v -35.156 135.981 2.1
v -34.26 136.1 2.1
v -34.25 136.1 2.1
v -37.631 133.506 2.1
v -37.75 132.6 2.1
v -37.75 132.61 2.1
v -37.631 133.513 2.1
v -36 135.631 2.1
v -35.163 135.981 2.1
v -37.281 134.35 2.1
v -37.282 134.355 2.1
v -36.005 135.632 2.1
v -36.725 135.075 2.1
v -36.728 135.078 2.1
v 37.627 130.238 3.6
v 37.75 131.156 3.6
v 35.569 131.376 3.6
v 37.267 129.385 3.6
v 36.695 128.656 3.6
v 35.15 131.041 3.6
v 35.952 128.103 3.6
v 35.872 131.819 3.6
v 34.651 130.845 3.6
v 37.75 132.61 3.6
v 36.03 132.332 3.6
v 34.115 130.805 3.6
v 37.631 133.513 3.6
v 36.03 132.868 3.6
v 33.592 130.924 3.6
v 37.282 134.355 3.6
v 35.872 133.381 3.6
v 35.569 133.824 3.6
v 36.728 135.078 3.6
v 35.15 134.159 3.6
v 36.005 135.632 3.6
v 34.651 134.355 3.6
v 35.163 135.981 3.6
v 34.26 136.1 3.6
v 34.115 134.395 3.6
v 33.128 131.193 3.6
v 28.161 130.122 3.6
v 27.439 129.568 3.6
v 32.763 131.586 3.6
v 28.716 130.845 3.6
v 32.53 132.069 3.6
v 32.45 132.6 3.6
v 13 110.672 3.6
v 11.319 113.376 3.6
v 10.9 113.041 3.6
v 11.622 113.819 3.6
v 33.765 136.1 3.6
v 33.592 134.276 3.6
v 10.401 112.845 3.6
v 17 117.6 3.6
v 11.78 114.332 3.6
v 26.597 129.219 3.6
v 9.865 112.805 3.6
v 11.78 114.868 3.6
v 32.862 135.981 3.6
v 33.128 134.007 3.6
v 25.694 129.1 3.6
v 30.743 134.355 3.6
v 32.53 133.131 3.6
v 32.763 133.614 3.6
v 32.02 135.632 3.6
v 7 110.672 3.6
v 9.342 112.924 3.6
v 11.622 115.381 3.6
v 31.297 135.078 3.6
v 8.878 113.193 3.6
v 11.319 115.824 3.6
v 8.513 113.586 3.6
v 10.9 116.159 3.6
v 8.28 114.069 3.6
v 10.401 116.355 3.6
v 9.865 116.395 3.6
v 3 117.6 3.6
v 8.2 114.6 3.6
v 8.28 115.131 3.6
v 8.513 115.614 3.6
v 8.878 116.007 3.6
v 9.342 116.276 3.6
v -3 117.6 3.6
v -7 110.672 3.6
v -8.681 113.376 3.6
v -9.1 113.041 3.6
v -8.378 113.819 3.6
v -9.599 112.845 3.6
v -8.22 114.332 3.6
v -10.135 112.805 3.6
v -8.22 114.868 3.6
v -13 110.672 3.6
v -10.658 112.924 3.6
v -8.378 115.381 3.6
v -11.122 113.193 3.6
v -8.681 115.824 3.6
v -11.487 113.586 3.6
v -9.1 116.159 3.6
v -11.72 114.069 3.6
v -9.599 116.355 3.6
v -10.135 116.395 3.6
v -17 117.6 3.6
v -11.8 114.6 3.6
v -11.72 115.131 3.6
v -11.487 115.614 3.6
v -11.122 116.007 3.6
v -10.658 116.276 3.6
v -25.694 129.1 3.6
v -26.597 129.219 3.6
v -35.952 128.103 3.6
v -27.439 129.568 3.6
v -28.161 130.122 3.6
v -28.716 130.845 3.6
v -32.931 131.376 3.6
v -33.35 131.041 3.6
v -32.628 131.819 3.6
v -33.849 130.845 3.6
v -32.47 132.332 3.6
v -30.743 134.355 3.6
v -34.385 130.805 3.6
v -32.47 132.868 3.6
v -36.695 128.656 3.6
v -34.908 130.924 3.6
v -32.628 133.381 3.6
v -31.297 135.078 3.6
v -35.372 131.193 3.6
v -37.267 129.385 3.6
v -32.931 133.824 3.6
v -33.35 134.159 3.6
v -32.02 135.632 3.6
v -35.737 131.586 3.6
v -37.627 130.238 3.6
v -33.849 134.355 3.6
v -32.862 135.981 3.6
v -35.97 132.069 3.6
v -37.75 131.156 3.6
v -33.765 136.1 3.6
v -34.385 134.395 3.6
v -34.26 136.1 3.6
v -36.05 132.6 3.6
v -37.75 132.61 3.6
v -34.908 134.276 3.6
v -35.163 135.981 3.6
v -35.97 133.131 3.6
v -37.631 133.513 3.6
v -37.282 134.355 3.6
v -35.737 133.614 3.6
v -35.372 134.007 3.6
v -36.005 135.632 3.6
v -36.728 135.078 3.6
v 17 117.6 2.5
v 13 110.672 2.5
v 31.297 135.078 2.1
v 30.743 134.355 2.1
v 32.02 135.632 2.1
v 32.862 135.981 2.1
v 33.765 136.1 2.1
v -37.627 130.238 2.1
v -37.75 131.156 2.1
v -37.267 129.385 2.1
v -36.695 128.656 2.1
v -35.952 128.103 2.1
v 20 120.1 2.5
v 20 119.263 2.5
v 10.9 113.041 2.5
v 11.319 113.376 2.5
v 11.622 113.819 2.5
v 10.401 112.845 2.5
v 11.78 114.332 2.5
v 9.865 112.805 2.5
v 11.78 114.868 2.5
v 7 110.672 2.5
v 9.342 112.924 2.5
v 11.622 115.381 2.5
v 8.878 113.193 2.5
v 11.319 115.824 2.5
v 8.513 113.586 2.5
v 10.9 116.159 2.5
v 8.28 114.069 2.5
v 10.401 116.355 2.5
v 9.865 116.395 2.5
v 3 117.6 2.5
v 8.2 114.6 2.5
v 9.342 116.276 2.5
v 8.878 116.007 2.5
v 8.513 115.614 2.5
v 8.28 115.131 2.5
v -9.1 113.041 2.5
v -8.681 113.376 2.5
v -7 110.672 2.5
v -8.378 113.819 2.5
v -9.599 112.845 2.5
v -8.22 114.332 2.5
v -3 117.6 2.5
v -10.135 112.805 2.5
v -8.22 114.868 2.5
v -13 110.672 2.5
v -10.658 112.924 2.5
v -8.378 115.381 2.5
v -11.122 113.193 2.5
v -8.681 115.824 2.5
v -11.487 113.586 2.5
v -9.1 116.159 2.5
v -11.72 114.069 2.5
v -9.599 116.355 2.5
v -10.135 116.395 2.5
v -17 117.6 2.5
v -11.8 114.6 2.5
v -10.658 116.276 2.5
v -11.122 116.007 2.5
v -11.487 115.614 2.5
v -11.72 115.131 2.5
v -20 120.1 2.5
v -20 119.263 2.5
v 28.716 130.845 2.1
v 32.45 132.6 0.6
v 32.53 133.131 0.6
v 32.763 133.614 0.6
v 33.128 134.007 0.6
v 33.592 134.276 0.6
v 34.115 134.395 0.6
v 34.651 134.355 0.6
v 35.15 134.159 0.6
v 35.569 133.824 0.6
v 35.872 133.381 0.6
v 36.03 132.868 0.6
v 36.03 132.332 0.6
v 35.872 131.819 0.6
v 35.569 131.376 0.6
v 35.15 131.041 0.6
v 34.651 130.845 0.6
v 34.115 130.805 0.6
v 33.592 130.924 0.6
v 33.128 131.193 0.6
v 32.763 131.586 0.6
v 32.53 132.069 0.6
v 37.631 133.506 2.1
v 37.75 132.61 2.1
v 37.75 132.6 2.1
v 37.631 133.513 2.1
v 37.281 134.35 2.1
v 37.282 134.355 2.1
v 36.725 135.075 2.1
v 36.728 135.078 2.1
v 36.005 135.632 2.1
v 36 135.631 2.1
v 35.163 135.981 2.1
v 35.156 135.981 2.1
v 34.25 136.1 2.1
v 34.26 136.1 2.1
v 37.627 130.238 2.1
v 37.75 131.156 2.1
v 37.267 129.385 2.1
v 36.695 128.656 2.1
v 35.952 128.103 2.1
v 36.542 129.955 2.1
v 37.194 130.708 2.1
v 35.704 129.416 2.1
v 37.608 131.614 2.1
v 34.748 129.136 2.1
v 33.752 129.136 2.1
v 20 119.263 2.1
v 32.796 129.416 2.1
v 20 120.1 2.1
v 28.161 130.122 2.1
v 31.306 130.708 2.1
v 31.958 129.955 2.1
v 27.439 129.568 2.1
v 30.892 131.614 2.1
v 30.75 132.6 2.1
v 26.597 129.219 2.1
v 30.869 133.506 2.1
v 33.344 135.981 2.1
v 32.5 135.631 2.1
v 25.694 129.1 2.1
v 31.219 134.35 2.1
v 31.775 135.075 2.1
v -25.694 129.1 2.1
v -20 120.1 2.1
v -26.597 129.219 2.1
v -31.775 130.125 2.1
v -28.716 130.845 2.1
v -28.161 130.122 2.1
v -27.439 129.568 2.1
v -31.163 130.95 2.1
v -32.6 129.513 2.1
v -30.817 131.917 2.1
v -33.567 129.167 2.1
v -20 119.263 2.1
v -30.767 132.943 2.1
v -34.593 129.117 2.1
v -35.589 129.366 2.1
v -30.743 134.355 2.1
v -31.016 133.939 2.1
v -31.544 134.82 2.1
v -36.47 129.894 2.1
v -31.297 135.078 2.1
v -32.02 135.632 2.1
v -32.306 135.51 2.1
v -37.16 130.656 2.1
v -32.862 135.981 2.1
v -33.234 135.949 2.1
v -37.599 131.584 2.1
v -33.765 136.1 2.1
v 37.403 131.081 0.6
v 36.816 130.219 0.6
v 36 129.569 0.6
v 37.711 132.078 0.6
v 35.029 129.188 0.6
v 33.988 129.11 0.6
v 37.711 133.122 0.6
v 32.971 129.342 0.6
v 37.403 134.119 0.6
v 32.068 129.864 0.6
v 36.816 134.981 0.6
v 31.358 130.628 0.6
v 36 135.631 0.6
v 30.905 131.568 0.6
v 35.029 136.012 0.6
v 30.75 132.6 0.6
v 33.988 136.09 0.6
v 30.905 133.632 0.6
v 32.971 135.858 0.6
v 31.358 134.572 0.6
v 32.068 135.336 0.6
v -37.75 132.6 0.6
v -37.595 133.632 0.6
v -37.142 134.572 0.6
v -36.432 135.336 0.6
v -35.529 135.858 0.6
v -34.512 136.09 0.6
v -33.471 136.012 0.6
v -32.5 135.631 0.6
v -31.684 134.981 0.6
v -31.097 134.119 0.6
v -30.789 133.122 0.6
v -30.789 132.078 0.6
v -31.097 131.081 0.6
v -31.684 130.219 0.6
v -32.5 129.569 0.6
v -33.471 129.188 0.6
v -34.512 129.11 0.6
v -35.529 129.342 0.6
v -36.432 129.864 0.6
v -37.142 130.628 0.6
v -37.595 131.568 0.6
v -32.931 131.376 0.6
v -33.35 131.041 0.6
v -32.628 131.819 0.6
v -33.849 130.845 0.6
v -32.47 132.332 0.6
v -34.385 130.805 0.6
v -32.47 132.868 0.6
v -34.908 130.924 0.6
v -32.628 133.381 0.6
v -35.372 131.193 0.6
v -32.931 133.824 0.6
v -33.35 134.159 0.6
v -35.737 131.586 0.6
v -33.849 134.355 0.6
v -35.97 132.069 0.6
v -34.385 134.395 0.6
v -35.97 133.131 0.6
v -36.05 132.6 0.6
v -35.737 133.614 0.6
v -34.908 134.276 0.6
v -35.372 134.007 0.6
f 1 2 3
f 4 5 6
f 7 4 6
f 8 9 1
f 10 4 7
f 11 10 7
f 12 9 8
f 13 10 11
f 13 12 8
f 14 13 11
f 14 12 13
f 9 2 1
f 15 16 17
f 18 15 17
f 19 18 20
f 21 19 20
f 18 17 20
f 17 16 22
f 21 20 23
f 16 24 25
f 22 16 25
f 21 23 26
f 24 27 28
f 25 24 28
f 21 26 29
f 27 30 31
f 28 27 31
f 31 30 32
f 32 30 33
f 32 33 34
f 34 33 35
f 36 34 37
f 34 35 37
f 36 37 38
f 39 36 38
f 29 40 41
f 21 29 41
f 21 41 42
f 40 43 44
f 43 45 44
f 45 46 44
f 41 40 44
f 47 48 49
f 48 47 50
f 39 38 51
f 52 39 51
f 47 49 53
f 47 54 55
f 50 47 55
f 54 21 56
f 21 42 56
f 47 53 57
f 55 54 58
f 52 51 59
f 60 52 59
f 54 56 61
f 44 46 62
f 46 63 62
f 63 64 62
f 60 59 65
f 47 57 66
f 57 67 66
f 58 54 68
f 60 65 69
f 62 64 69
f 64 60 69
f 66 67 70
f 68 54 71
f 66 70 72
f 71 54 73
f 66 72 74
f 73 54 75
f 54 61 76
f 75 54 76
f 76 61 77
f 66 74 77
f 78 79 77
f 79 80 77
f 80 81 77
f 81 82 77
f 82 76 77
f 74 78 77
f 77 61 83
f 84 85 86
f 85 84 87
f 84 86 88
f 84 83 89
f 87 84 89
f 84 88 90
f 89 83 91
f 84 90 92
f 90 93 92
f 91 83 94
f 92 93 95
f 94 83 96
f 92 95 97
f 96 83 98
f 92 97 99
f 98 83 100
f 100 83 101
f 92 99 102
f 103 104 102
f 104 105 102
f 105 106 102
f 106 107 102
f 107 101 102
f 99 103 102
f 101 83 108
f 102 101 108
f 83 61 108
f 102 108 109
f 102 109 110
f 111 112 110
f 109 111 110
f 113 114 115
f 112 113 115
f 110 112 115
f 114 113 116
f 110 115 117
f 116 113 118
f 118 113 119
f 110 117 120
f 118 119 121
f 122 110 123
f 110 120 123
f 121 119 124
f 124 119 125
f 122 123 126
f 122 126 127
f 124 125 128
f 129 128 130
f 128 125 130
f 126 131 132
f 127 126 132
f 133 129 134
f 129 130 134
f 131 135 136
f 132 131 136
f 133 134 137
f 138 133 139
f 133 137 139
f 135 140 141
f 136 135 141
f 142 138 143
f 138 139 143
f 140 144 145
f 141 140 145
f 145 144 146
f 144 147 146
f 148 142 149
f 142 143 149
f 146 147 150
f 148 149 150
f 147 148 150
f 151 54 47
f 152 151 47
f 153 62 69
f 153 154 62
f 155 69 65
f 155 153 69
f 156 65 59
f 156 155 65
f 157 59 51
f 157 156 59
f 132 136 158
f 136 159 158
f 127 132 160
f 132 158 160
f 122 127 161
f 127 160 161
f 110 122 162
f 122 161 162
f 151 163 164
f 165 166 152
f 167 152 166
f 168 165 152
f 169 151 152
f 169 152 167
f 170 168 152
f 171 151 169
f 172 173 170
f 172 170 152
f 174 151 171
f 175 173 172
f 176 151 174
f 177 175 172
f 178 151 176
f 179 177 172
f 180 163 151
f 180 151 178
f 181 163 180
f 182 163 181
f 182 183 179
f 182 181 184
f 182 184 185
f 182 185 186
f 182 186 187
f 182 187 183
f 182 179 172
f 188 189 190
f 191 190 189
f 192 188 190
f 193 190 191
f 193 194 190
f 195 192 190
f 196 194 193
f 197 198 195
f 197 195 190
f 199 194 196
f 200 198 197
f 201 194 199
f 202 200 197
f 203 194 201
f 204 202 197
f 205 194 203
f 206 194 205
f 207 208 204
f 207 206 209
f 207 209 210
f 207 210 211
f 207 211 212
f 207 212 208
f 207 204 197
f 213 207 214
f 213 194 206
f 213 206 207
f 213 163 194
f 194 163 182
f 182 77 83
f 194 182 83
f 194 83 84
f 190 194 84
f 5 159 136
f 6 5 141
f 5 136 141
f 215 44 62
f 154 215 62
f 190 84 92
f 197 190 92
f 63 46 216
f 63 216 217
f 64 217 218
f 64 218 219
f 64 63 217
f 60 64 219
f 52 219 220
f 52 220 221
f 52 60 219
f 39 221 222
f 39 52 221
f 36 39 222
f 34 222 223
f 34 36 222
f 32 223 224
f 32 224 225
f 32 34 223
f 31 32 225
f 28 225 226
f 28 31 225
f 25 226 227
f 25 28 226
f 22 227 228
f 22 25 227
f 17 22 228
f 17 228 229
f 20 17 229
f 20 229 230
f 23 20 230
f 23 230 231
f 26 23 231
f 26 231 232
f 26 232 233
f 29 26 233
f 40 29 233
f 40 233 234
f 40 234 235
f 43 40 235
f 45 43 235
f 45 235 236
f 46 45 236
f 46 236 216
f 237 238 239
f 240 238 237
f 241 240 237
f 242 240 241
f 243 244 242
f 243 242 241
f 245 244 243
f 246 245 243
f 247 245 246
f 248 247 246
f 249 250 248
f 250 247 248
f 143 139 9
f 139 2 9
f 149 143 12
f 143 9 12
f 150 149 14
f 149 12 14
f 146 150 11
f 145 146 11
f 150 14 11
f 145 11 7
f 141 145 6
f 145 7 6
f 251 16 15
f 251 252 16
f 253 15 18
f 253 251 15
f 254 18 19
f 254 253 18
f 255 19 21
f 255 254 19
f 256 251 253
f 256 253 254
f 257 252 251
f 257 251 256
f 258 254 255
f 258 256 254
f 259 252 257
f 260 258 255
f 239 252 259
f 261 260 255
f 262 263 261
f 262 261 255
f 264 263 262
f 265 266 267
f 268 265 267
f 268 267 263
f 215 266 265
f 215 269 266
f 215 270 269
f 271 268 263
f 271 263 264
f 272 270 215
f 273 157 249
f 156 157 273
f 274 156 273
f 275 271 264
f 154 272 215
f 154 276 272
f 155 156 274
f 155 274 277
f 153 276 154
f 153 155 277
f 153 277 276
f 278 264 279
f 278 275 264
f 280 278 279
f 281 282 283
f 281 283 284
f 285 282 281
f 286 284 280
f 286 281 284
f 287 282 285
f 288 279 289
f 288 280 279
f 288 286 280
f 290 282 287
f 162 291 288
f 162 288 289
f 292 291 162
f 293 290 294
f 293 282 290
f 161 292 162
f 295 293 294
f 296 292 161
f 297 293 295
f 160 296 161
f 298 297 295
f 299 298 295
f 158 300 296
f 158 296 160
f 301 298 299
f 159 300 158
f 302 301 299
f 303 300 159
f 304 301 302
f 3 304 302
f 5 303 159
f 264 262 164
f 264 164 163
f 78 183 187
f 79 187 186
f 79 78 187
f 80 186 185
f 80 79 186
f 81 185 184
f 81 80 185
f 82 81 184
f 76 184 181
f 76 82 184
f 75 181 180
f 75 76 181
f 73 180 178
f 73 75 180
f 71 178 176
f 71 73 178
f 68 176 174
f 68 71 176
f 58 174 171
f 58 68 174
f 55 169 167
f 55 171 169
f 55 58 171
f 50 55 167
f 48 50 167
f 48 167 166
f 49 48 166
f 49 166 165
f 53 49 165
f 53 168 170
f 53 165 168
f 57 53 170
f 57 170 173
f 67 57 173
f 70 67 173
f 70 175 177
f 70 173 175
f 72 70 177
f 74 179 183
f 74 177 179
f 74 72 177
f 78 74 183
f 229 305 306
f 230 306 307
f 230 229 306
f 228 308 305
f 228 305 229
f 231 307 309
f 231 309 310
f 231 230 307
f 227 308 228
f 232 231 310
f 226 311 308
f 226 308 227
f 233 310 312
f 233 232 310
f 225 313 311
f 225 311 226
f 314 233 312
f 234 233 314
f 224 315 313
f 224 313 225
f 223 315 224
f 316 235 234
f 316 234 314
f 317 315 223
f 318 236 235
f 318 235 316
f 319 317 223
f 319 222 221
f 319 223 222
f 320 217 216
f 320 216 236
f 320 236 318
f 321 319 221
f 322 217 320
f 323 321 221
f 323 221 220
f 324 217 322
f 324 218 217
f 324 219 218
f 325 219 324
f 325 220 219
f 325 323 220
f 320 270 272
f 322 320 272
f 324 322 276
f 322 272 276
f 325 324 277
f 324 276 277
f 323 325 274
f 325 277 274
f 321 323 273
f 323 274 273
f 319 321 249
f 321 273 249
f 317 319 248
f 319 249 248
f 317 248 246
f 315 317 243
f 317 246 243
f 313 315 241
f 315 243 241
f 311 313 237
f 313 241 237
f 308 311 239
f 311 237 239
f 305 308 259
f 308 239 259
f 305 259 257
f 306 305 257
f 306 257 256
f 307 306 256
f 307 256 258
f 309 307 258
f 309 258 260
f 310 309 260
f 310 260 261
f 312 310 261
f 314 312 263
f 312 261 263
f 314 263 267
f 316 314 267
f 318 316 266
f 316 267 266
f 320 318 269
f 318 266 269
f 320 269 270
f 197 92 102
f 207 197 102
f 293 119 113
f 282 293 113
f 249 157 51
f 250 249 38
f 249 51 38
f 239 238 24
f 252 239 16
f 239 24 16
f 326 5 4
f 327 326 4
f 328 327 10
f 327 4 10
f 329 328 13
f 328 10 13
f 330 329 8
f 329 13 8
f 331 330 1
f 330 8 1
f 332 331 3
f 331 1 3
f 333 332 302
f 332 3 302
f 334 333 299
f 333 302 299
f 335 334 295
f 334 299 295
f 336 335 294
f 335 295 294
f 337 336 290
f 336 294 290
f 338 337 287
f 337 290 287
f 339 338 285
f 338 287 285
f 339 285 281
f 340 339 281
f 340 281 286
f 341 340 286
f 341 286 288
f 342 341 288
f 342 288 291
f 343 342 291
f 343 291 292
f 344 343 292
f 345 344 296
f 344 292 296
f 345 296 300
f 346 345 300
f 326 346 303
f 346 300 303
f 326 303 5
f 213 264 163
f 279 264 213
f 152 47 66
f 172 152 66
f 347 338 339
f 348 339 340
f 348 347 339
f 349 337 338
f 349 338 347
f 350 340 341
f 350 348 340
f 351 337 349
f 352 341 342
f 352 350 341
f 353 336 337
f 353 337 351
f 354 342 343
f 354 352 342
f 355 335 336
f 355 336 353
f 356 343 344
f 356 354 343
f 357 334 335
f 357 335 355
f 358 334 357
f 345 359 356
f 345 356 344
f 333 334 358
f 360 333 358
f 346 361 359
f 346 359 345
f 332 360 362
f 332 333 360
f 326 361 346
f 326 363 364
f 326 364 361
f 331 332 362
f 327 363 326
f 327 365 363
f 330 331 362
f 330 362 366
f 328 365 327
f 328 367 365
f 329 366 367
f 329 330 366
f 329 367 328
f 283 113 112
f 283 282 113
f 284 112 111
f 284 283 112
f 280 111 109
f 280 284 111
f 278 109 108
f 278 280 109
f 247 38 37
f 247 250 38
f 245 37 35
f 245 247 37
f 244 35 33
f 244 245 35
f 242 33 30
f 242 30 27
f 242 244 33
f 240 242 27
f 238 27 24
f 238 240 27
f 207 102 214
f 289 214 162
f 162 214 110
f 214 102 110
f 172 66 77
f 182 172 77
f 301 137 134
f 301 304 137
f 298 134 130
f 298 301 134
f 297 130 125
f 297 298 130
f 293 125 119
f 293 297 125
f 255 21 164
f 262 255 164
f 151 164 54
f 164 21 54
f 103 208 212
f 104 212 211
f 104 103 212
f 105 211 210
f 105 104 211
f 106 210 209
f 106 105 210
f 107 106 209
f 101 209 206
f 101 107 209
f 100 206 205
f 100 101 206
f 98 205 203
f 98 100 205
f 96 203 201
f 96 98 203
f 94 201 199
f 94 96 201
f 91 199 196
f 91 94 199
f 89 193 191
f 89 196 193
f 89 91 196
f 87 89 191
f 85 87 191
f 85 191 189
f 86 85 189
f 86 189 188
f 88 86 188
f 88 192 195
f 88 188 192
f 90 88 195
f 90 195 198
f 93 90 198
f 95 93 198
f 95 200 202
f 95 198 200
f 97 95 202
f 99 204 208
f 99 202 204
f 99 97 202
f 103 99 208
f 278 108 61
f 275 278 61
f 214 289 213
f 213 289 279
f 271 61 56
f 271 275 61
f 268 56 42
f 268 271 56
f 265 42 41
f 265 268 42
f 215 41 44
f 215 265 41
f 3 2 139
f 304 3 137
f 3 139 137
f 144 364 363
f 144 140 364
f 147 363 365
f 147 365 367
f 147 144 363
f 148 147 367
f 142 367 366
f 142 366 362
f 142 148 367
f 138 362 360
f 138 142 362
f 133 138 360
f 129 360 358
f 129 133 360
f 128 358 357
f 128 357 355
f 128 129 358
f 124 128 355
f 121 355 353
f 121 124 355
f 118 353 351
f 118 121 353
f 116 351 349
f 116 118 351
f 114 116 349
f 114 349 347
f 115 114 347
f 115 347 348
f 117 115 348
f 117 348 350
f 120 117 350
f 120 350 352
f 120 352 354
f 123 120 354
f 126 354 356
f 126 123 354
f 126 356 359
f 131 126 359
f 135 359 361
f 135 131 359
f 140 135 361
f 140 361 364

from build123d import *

# Parameters (mm, degrees)
COPYSKETCH005_R         = 1.8
PAD001_DEPTH            = 1.5
SKETCH005_R             = 3.5
SKETCH005_R_2           = 1.8
PAD002_DEPTH            = 1.5
FILLET_R                = 3.49
SKETCH010_W             = 40
SKETCH010_H             = 11
POCKET005_DEPTH         = 0.4
BODY001_PLACEMENT_ANGLE = 180


with BuildPart() as part:
    # CopySketch005 → Pad001 (new body)
    with BuildSketch(Plane.XY):
        Polygon((-13, -3.9282032303), (-7, -3.9282032303), (-3, 3), (3, 3), (7, -3.9282032303), (13, -3.9282032303), (17, 3), (37.75, 14.5), (37.75, 21.5), (31.75, 21.5), (27.7085481157, 14.5), (-27.7085481157, 14.5), (-31.75, 21.5), (-37.75, 21.5), (-37.75, 14.5), (-17, 3), align=None)
        with Locations((-10, 0)):
            Circle(COPYSKETCH005_R, mode=Mode.SUBTRACT)
        with Locations((10, 0)):
            Circle(COPYSKETCH005_R, mode=Mode.SUBTRACT)
        with Locations((34.25, 18)):
            Circle(COPYSKETCH005_R, mode=Mode.SUBTRACT)
        with Locations((-34.25, 18)):
            Circle(COPYSKETCH005_R, mode=Mode.SUBTRACT)
    extrude(amount=PAD001_DEPTH)

    # Sketch005 (on Face22 of Pad001) → Pad002 (join)
    with BuildSketch(Plane.XY.offset(1.5)):
        with Locations((34.25, 18)):
            Circle(SKETCH005_R)
        with Locations((34.25, 18)):
            Circle(SKETCH005_R_2, mode=Mode.SUBTRACT)
        with Locations((-34.25, 18)):
            Circle(SKETCH005_R)
        with Locations((-34.25, 18)):
            Circle(SKETCH005_R_2, mode=Mode.SUBTRACT)
    extrude(amount=PAD002_DEPTH)

    # Fillet
    fillet_edges = [part.edges().sort_by_distance(p)[0] for p in [
        (-31.75, 21.5, 0.75),
        (-37.75, 21.5, 0.75),
        (-27.708548, 14.5, 0.75),
        (27.708548, 14.5, 0.75),
        (31.75, 21.5, 0.75),
        (37.75, 21.5, 0.75),
        (37.75, 14.5, 0.75),
        (-37.75, 14.5, 0.75),
    ]]
    fillet(fillet_edges, radius=FILLET_R)

    # Sketch010 (on Face30 of Fillet) → Pocket005 (cut)
    with BuildSketch(Plane.XY.offset(1.5)):
        Rectangle(SKETCH010_W, SKETCH010_H)
    extrude(amount=-POCKET005_DEPTH, mode=Mode.SUBTRACT)


with BuildPart() as part_1:
    # Body001 placement: moved
    add(part.part.moved(Location((0, 114.6, 3.6))).rotate(Axis((0, 114.6, 3.6), (0, 1, 0)), BODY001_PLACEMENT_ANGLE))


solid = part_1.part
